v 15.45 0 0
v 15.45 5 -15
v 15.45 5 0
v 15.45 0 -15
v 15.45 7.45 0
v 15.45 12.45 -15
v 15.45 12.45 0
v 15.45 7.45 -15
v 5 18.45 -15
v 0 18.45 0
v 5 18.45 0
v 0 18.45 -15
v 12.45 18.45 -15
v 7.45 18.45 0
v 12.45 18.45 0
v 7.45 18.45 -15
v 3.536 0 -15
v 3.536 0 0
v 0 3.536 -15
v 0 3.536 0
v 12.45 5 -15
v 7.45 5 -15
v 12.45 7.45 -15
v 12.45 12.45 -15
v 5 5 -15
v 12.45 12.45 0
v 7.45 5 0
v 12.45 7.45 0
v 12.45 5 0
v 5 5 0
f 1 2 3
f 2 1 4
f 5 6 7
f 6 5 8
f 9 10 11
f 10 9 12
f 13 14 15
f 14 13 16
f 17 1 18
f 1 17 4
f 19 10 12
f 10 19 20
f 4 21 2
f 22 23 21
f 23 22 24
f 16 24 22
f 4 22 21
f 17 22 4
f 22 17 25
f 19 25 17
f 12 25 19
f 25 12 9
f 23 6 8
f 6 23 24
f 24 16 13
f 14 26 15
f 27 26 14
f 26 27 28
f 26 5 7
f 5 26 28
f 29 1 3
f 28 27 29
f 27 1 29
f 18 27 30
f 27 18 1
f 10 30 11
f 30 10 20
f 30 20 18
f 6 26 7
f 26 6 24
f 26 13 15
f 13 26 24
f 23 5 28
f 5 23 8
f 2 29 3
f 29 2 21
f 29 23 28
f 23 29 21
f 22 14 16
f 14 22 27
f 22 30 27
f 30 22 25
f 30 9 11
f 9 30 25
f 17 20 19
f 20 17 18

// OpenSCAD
GLASS_THICKNESS=2.45;
WALL_THICK=5;
WALL_LENGTH=30;

CORNER_ENTIRE_WIDTH=2*WALL_THICK + GLASS_THICKNESS;
echo("CORNER_ENTIRE_WIDTH=", CORNER_ENTIRE_WIDTH);

module joint() {  
  
  difference()
  {
    cube([CORNER_ENTIRE_WIDTH + 3, WALL_LENGTH / 2, CORNER_ENTIRE_WIDTH + 6]);  

    // Remove the large chunk from the middle to form the walls
    translate([CORNER_ENTIRE_WIDTH, -0.01, CORNER_ENTIRE_WIDTH])
      cube([WALL_LENGTH, WALL_LENGTH + 0.02 , WALL_LENGTH]);
   
    translate([CORNER_ENTIRE_WIDTH, -0.01 , WALL_THICK])
      cube([WALL_LENGTH, WALL_LENGTH + 0.02, GLASS_THICKNESS]);
    
    translate([WALL_THICK, -0.01, WALL_THICK])
      cube([GLASS_THICKNESS, WALL_LENGTH + 0.02, WALL_LENGTH]);
    
    // Knock down sharp corders on other exposed sides
    rotate(45, [0,1,0])
      translate([-WALL_THICK/2, -1, -WALL_THICK/2])
        cube([WALL_THICK, WALL_LENGTH + 2, WALL_THICK]);
   
  }
}




// Rotate for printing
rotate(-90,[1,0,0])
joint();


    
